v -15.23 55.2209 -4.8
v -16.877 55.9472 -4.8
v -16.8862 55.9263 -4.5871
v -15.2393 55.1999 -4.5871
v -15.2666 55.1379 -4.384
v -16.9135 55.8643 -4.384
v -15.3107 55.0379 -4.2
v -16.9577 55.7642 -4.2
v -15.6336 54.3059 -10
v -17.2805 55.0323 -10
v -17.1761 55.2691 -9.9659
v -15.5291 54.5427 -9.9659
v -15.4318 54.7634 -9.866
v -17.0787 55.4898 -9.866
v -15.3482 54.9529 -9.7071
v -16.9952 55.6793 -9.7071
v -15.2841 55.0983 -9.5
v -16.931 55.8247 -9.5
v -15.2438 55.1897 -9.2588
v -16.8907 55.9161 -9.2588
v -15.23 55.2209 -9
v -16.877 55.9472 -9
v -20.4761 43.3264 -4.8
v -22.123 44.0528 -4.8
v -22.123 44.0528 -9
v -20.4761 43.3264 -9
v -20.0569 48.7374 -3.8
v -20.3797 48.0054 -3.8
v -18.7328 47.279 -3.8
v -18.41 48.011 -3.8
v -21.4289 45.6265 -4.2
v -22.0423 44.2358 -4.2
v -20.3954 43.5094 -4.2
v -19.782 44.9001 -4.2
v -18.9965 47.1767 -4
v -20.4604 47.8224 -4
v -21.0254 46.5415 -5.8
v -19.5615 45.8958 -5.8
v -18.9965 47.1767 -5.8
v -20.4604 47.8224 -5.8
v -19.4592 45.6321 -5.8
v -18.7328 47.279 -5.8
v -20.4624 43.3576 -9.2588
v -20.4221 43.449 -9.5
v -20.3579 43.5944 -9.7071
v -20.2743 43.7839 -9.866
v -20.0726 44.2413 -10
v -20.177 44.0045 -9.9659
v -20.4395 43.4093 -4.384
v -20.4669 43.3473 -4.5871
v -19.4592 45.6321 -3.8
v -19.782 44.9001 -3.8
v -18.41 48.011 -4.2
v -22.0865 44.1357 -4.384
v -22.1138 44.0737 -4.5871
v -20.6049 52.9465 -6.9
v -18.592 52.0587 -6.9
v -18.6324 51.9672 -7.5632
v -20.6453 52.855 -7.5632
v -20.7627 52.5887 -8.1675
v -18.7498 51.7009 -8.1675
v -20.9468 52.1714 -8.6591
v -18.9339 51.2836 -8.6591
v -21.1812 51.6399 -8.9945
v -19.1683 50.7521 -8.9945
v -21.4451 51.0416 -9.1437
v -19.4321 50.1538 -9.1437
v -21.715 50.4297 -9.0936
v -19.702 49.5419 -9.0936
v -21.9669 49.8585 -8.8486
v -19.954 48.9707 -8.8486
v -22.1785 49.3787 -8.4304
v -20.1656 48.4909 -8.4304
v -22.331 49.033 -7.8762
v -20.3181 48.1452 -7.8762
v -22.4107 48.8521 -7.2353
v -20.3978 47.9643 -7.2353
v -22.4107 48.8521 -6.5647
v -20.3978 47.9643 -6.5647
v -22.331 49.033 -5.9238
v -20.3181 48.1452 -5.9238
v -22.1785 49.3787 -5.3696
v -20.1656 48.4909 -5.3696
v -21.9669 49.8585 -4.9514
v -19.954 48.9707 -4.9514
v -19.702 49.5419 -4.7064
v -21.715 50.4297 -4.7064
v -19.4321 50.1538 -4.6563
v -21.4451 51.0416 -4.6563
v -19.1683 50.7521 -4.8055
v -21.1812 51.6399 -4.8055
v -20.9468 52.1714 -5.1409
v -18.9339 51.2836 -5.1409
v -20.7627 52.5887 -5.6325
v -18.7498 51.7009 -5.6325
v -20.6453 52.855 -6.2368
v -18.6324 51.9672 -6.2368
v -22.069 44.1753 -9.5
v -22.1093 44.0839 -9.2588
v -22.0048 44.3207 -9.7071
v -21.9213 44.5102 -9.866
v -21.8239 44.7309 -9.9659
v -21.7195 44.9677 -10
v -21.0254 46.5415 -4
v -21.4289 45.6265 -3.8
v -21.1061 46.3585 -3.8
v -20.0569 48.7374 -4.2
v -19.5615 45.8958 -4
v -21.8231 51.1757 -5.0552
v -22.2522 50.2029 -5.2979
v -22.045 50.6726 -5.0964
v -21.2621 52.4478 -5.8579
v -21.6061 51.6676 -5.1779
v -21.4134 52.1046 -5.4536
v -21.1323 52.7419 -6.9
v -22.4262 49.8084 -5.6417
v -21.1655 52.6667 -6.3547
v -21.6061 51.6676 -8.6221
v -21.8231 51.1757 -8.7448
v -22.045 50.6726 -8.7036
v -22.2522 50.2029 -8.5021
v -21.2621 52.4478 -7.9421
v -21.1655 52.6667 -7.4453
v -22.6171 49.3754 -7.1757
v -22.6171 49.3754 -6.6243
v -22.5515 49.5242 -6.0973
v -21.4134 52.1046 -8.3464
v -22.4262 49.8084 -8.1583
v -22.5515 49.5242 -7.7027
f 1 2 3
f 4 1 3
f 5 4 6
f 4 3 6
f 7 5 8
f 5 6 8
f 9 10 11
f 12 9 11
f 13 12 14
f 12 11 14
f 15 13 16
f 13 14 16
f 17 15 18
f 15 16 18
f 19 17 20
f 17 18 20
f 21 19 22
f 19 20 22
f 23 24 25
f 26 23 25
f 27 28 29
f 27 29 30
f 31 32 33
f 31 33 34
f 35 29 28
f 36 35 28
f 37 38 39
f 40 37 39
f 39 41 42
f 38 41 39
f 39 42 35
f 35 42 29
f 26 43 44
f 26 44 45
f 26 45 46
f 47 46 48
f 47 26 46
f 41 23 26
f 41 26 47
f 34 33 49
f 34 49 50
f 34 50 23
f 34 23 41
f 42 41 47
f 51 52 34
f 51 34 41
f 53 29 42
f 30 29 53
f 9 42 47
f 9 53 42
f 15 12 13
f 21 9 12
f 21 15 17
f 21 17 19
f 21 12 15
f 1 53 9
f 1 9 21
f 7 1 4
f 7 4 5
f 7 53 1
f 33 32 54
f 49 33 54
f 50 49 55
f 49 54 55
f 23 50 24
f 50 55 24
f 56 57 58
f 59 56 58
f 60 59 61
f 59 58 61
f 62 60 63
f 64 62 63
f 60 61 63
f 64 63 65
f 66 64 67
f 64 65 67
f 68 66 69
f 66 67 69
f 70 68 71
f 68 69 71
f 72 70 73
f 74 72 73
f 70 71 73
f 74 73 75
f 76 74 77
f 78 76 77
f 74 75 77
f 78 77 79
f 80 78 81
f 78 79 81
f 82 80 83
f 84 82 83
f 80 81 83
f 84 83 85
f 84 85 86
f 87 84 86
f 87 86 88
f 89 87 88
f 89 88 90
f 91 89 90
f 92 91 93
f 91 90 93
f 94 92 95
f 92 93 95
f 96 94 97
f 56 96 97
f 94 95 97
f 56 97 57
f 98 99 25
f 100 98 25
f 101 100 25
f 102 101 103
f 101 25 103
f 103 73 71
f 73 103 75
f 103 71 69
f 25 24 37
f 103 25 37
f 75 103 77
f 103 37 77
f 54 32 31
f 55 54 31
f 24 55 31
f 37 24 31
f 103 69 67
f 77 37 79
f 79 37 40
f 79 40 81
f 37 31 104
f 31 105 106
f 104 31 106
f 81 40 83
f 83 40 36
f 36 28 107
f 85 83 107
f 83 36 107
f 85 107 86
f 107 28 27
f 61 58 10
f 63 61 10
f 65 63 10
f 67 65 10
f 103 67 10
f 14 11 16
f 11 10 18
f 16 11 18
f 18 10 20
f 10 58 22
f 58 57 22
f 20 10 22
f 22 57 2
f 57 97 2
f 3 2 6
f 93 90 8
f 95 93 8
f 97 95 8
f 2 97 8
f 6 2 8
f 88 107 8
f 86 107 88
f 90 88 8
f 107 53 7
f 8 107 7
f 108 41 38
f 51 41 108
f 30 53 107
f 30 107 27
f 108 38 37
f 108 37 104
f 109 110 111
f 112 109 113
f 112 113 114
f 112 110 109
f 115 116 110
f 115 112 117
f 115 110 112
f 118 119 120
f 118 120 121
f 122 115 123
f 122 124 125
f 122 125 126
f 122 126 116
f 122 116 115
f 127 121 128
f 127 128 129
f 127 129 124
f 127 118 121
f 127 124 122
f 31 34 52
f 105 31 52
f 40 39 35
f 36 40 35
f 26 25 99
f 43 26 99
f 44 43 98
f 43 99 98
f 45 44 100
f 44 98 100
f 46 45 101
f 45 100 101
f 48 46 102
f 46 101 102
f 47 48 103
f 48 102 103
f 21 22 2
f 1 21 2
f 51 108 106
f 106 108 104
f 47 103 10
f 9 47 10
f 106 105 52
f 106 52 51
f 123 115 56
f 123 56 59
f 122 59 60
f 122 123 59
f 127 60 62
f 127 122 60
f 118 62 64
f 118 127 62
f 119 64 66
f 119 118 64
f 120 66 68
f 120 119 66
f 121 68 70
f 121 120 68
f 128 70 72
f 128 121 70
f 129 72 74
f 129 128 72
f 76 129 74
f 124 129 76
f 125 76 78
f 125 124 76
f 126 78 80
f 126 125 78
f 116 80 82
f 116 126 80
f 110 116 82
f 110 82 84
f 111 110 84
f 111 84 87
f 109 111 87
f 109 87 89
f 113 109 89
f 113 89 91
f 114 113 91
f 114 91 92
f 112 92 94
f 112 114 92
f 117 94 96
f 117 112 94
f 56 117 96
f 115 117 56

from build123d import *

# Parameters (mm, degrees)
PAD039_DEPTH            = 1.8
SKETCH116_R             = 2.25
PAD040_DEPTH            = 2.6
CHAMFER003_SIZE         = 0.4
SKETCH117_W             = 1.4
SKETCH117_H             = 2
SKETCH117_W_2           = 9.515449
SKETCH117_H_2           = 0.4
SKETCH117_W_3           = 4.064247
POCKET008_DEPTH         = 1.8
CHAMFER004_SIZE         = 0.2
BODY039_PLACEMENT_ANGLE = 23.8


with BuildPart() as part:
    # Sketch115 → Pad039 (new body)
    with BuildSketch(Plane.YZ):
        with BuildLine():
            Line((-6.5, 2.1), (-6.5, -2.1))
            ThreePointArc((-6.5, -2.1), (-6.207107, -2.807107), (-5.5, -3.1))
            Line((-5.5, -3.1), (5.5, -3.1))
            ThreePointArc((5.5, -3.1), (6.207107, -2.807107), (6.5, -2.1))
            Line((6.5, -2.1), (6.5, 2.1))
            ThreePointArc((6.5, 2.1), (6.207107, 2.807107), (5.5, 3.1))
            Line((-5.5, 3.1), (5.5, 3.1))
            ThreePointArc((-5.5, 3.1), (-6.207107, 2.807107), (-6.5, 2.1))
        make_face()
    extrude(amount=PAD039_DEPTH)

    # Sketch116 (on Face9 of Pad039) → Pad040 (join)
    with BuildSketch(Plane(origin=(0, 0, 0), x_dir=(0, 1, 0), z_dir=(-1, 0, 0))):
        Circle(SKETCH116_R)
    extrude(amount=PAD040_DEPTH)

    # Chamfer003
    chamfer003_edges = [part.edges().sort_by_distance(p)[0] for p in [
        (-2.6, -2.25, 0),
    ]]
    chamfer(chamfer003_edges, length=CHAMFER003_SIZE)

    # Sketch117 (on Face13 of Chamfer003) → Pocket008 (cut)
    with BuildSketch(Plane.YZ.offset(1.8)):
        with Locations((-3.08, 2.1)):
            Rectangle(SKETCH117_W, SKETCH117_H)
        with Locations((3.377724, 2.9)):
            Rectangle(SKETCH117_W_2, SKETCH117_H_2)
        with Locations((-6.812123, 2.9)):
            Rectangle(SKETCH117_W_3, SKETCH117_H_2)
    extrude(amount=-POCKET008_DEPTH, mode=Mode.SUBTRACT)

    # Chamfer004
    chamfer004_edges = [part.edges().sort_by_distance(p)[0] for p in [
        (0.9, -2.38, 3.1),
        (0.9, -3.78, 3.1),
        (1.8, -2.38, 2.1),
        (1.8, -3.78, 2.1),
    ]]
    chamfer(chamfer004_edges, length=CHAMFER004_SIZE)


with BuildPart() as part_1:
    # Body039 placement: moved
    add(part.part.moved(Location((-19.5, 50, -6.9))).rotate(Axis((-19.5, 50, -6.9), (0, 0, -1)), BODY039_PLACEMENT_ANGLE))


solid = part_1.part
